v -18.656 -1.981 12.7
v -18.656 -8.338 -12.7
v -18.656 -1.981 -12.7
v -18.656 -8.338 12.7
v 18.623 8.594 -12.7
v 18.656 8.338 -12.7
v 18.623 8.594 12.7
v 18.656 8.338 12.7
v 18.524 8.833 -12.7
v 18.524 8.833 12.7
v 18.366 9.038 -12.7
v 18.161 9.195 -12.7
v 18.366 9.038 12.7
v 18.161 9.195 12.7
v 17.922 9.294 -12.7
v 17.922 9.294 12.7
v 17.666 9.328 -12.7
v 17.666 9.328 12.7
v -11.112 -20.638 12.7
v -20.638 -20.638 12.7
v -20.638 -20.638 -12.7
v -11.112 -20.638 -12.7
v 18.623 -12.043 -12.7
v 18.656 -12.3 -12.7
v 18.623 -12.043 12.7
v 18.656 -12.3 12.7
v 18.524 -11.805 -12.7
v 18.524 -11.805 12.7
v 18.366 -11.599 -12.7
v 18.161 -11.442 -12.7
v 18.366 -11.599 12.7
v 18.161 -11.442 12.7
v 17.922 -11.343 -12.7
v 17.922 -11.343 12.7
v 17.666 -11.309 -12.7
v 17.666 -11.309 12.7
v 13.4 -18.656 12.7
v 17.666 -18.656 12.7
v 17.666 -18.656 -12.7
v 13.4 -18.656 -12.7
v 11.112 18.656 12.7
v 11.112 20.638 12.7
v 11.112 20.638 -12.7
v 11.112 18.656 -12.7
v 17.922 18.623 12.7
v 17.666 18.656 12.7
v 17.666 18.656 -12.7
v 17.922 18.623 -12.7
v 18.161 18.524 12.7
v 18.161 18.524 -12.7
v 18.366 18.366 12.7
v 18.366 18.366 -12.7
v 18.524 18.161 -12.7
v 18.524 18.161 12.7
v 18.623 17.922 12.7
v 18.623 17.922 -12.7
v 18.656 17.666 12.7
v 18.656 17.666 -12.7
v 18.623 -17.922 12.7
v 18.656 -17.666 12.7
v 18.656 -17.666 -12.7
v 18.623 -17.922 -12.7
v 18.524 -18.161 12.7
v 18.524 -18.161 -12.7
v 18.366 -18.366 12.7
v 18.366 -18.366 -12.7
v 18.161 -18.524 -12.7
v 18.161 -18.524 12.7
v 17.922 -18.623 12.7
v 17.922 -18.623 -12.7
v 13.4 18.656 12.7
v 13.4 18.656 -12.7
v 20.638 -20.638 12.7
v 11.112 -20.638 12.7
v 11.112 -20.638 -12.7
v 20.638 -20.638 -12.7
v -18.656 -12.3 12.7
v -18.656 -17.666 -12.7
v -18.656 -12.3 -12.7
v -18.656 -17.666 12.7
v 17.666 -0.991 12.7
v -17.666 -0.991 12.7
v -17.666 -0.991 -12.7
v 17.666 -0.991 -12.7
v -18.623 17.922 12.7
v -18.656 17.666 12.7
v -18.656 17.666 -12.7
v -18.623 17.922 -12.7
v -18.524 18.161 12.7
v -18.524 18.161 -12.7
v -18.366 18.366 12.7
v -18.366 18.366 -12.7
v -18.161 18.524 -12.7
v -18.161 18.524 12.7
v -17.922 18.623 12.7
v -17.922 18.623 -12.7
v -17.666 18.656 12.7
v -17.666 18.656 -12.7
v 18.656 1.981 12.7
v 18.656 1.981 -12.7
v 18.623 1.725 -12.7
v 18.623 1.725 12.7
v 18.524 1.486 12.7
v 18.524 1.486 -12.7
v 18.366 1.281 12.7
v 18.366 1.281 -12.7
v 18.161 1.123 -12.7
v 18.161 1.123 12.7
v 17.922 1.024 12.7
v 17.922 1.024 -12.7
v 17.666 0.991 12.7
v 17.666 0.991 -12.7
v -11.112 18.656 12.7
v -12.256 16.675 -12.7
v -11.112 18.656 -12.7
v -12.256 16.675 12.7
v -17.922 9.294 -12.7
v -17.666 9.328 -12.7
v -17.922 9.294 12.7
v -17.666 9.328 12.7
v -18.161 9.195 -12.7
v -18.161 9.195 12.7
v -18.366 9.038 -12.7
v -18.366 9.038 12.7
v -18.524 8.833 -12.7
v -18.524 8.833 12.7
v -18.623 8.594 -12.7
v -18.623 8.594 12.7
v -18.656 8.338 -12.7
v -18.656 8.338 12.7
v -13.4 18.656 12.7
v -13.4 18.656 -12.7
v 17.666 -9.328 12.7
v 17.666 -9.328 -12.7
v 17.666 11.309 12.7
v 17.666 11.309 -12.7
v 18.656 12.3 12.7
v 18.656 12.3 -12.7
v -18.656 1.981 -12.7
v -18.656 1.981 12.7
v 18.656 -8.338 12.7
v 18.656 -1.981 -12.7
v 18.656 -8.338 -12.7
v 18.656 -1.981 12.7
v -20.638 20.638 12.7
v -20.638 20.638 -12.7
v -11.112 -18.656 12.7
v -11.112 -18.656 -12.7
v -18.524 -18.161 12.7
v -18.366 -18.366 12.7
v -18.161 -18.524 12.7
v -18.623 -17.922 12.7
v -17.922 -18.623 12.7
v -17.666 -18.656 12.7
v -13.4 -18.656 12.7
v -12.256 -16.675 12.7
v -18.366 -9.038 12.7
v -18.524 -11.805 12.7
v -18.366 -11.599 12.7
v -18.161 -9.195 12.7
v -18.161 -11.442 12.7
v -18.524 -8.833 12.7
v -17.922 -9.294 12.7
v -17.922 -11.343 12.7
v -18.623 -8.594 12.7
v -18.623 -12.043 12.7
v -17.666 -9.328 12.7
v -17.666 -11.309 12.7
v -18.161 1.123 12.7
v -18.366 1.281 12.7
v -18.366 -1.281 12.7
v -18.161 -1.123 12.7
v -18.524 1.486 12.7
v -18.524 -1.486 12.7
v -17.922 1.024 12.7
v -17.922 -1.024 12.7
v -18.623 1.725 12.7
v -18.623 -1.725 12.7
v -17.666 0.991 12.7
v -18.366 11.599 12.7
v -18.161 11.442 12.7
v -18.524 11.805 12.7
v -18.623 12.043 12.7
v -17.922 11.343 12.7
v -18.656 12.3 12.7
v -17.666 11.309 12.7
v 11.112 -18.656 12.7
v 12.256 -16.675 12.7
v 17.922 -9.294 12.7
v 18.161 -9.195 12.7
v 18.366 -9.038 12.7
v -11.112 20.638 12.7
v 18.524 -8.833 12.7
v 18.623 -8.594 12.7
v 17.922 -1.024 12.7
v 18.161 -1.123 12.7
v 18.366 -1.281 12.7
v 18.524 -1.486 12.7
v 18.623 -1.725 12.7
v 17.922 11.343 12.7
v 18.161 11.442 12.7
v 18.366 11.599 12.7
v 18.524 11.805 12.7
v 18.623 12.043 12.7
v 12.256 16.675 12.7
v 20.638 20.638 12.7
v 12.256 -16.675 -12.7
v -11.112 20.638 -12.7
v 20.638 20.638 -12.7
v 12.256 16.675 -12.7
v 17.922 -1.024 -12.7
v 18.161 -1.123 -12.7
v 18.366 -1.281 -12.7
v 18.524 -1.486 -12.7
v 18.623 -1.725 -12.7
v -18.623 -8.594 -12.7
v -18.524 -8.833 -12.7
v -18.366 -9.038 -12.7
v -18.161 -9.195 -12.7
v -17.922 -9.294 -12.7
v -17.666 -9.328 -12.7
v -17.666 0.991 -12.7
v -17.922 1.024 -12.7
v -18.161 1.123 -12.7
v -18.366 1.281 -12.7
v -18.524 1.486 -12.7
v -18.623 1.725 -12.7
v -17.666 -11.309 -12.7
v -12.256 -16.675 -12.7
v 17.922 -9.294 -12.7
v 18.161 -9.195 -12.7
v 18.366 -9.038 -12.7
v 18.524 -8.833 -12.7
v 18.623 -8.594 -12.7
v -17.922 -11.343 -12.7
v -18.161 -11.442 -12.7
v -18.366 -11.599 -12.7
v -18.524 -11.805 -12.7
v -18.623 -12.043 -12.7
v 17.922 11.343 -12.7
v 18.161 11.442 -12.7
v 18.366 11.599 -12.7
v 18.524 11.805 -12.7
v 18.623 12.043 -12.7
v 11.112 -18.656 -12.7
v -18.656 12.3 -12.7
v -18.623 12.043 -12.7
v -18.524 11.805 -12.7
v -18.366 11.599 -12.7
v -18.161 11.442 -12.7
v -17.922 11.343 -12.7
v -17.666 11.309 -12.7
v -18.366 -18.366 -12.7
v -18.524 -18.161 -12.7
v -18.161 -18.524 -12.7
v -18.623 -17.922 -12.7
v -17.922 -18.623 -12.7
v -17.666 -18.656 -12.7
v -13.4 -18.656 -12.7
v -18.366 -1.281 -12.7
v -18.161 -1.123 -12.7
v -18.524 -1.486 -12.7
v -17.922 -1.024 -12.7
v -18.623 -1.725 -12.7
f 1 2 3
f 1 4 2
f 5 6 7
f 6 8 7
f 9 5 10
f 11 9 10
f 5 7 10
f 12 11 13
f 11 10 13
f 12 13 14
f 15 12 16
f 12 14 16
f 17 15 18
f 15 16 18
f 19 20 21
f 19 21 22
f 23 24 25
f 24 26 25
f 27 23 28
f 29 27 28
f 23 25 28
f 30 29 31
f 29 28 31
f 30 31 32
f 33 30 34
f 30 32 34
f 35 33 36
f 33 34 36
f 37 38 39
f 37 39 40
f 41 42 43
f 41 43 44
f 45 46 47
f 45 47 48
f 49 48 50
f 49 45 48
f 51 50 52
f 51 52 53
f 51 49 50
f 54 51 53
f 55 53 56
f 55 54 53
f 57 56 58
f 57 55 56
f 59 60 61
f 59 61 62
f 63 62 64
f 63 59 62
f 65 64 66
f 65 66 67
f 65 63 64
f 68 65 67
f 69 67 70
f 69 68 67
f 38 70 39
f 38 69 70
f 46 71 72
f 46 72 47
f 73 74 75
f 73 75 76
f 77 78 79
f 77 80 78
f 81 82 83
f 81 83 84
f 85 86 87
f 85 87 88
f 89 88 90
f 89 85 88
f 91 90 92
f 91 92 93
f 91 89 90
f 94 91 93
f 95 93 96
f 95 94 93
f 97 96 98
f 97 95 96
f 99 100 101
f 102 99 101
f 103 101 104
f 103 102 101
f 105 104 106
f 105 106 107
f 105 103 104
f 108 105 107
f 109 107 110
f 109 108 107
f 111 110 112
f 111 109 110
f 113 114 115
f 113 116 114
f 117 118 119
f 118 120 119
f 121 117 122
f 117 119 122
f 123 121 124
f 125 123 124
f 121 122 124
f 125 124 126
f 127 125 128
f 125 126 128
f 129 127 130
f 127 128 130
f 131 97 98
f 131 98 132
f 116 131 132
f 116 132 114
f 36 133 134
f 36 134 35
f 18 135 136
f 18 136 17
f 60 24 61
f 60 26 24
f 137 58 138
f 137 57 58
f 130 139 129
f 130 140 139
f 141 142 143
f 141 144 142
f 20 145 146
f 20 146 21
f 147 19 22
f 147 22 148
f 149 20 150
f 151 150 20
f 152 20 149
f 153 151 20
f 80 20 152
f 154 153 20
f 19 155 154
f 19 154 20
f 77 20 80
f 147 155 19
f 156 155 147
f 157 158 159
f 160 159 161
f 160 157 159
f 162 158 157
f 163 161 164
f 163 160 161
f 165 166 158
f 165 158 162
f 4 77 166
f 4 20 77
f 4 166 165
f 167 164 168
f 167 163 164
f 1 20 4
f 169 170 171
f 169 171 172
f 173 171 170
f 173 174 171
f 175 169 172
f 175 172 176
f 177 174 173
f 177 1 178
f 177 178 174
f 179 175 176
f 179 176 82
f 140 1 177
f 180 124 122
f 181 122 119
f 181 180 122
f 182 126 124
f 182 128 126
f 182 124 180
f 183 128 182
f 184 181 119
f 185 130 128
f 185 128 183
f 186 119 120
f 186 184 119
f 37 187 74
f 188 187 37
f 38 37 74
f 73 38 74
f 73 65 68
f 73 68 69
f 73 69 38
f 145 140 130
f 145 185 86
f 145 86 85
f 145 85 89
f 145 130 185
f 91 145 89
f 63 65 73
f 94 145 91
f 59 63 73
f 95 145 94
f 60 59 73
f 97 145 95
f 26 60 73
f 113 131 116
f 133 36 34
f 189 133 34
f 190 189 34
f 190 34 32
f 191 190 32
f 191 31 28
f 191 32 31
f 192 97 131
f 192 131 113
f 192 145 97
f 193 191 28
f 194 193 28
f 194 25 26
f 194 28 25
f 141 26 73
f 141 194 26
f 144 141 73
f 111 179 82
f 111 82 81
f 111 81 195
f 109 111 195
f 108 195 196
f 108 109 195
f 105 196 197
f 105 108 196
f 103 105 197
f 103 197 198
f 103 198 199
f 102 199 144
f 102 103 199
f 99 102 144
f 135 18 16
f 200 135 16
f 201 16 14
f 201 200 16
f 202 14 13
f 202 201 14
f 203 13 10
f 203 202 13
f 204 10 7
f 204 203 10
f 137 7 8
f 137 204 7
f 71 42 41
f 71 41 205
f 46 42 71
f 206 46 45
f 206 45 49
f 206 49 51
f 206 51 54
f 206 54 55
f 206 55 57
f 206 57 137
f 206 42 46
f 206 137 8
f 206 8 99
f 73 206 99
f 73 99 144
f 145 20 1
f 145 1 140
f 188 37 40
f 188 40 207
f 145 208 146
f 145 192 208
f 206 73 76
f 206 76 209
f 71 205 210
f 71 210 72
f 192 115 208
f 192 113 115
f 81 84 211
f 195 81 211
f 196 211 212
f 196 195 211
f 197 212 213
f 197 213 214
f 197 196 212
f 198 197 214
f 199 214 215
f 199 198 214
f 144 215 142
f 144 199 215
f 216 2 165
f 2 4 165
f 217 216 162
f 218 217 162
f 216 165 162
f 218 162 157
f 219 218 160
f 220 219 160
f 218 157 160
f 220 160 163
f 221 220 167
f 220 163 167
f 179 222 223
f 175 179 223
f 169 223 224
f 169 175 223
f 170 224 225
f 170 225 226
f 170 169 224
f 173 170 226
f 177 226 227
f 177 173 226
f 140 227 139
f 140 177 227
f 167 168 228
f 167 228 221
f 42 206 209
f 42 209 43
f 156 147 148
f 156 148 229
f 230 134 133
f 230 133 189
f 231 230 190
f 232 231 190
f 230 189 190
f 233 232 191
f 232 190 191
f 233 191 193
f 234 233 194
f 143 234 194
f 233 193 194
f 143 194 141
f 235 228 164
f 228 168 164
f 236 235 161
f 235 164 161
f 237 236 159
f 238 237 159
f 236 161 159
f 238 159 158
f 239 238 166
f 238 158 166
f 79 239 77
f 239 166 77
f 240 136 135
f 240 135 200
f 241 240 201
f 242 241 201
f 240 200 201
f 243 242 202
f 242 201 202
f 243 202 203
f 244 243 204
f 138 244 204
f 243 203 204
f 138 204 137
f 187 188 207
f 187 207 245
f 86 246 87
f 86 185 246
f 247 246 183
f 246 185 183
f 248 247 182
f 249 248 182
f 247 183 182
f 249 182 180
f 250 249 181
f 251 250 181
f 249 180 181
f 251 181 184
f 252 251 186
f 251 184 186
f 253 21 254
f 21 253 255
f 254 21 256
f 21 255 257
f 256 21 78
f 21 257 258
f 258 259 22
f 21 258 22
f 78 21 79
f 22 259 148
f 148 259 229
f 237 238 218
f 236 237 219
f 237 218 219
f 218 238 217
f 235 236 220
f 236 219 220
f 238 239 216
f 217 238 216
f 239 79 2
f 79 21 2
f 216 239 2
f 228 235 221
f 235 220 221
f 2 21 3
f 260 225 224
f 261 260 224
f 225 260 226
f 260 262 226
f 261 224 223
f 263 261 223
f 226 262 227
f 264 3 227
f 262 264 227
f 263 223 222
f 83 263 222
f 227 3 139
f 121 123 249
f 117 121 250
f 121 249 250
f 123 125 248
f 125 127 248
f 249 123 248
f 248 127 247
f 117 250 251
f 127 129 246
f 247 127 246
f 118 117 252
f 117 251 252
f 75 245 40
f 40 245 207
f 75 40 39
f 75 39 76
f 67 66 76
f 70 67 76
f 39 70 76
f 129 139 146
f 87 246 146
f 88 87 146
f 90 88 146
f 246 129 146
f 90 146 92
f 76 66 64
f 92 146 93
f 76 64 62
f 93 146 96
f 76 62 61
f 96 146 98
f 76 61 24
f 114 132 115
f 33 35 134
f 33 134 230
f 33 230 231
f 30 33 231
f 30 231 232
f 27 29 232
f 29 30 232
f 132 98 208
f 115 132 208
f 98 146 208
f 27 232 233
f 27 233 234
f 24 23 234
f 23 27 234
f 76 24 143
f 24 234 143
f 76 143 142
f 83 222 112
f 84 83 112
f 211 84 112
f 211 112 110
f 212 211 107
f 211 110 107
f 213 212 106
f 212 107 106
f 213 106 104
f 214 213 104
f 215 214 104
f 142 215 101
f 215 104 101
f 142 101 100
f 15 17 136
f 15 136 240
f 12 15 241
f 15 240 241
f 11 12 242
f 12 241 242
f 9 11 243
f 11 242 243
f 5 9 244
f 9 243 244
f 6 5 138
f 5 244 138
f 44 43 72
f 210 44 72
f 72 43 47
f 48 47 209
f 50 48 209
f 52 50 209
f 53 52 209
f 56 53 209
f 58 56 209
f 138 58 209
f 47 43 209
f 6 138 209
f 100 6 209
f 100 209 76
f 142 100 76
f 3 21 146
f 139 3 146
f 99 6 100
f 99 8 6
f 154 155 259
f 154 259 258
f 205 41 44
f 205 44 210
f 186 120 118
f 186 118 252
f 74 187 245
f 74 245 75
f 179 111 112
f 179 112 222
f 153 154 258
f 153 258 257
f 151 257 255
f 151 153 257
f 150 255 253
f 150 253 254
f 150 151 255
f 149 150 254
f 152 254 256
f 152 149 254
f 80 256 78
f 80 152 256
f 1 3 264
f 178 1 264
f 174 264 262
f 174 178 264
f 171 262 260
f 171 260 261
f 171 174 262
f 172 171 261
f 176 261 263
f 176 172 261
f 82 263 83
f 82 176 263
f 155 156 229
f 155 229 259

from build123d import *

# Parameters (mm, degrees)
BASE_EXTRUDE_DEPTH = 12.7
FILLET1_R          = 0.9906


with BuildPart() as part:
    # Sketch1 → Base-Extrude (new, symmetric)
    with BuildSketch(Plane.XY):
        with BuildLine():
            Line((-11.1125, 20.6375), (-20.6375, 20.6375))
            Line((-20.6375, 20.6375), (-20.6375, -20.6375))
            Line((-20.6375, -20.6375), (-11.1125, -20.6375))
            Line((-11.1125, -20.6375), (-11.1125, -18.6563))
            Line((-11.1125, -18.6563), (-12.256346355, -16.6751))
            Line((-12.256346355, -16.6751), (-13.400192707, -18.6563))
            Line((-13.400192707, -18.6563), (-17.6657, -18.6563))
            ThreePointArc((-17.6657, -18.6563), (-18.366159977, -18.366159977), (-18.6563, -17.6657))
            Line((-18.6563, -17.6657), (-18.6563, -11.30935))
            Line((-18.6563, -11.30935), (-17.6657, -11.30935))
            Line((-17.6657, -11.30935), (-17.6657, -9.32815))
            Line((-17.6657, -9.32815), (-18.6563, -9.32815))
            Line((-18.6563, -9.32815), (-18.6563, -1.9812))
            ThreePointArc((-18.6563, -1.9812), (-18.366159977, -1.280740023), (-17.6657, -0.9906))
            Line((-17.6657, -0.9906), (17.6657, -0.9906))
            ThreePointArc((17.6657, -0.9906), (18.366159977, -1.280740023), (18.6563, -1.9812))
            Line((18.6563, -1.9812), (18.6563, -9.32815))
            Line((18.6563, -9.32815), (17.6657, -9.32815))
            Line((17.6657, -9.32815), (17.6657, -11.30935))
            Line((17.6657, -11.30935), (18.6563, -11.30935))
            Line((18.6563, -11.30935), (18.6563, -17.6657))
            ThreePointArc((18.6563, -17.6657), (18.366159977, -18.366159977), (17.6657, -18.6563))
            Line((17.6657, -18.6563), (13.400192707, -18.6563))
            Line((13.400192707, -18.6563), (12.256346355, -16.6751))
            Line((12.256346355, -16.6751), (11.1125, -18.6563))
            Line((11.1125, -18.6563), (11.1125, -20.6375))
            Line((11.1125, -20.6375), (20.6375, -20.6375))
            Line((20.6375, -20.6375), (20.6375, 20.6375))
            Line((20.6375, 20.6375), (11.1125, 20.6375))
            Line((11.1125, 20.6375), (11.1125, 18.6563))
            Line((11.1125, 18.6563), (12.256346355, 16.6751))
            Line((12.256346355, 16.6751), (13.400192707, 18.6563))
            Line((13.400192707, 18.6563), (17.6657, 18.6563))
            ThreePointArc((17.6657, 18.6563), (18.366159977, 18.366159977), (18.6563, 17.6657))
            Line((18.6563, 17.6657), (18.6563, 11.30935))
            Line((18.6563, 11.30935), (17.6657, 11.30935))
            Line((17.6657, 11.30935), (17.6657, 9.32815))
            Line((17.6657, 9.32815), (18.6563, 9.32815))
            Line((18.6563, 9.32815), (18.6563, 1.9812))
            ThreePointArc((18.6563, 1.9812), (18.366159977, 1.280740023), (17.6657, 0.9906))
            Line((17.6657, 0.9906), (-17.6657, 0.9906))
            ThreePointArc((-17.6657, 0.9906), (-18.366159977, 1.280740023), (-18.6563, 1.9812))
            Line((-18.6563, 1.9812), (-18.6563, 9.32815))
            Line((-18.6563, 9.32815), (-17.6657, 9.32815))
            Line((-17.6657, 9.32815), (-17.6657, 11.30935))
            Line((-17.6657, 11.30935), (-18.6563, 11.30935))
            Line((-18.6563, 11.30935), (-18.6563, 17.6657))
            ThreePointArc((-18.6563, 17.6657), (-18.366159977, 18.366159977), (-17.6657, 18.6563))
            Line((-17.6657, 18.6563), (-13.400192707, 18.6563))
            Line((-13.400192707, 18.6563), (-12.256346355, 16.6751))
            Line((-12.256346355, 16.6751), (-11.1125, 18.6563))
            Line((-11.1125, 18.6563), (-11.1125, 20.6375))
        make_face()
    extrude(amount=BASE_EXTRUDE_DEPTH, both=True)

    # Fillet1
    fillet1_edges = [part.edges().sort_by_distance(p)[0] for p in [
        (18.6563, 11.30935, 0),
        (18.6563, -9.32815, 0),
        (-18.6563, 11.30935, 0),
        (-18.6563, -9.32815, 0),
        (-18.6563, 9.32815, 0),
        (-18.6563, -11.30935, 0),
        (18.6563, 9.32815, 0),
        (18.6563, -11.30935, 0),
    ]]
    fillet(fillet1_edges, radius=FILLET1_R - 0.0001)  # a hair under: the kernel refuses the full size


solid = part.part
